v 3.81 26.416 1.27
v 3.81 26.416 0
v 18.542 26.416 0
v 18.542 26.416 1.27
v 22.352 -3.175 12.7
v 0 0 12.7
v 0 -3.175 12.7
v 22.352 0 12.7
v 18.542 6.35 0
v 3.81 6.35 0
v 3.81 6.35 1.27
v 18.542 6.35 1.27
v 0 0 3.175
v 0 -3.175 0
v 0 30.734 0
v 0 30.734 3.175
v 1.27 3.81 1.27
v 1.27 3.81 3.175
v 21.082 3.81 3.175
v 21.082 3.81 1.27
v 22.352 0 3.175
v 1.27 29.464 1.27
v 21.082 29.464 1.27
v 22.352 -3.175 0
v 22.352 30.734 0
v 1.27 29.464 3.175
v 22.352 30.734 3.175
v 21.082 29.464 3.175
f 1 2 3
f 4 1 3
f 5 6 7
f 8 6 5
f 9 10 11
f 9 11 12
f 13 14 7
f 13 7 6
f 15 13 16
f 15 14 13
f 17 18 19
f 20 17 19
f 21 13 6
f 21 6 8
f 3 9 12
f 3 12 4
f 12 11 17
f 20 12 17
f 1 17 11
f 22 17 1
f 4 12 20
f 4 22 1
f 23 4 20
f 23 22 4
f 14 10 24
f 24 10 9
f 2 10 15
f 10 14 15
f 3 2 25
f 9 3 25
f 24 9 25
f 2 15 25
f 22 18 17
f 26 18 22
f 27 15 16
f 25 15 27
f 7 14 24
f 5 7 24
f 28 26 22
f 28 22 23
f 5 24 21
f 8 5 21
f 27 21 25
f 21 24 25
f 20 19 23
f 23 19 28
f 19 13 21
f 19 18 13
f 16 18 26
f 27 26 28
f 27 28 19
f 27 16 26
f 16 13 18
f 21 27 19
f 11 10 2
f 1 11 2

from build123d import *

# Parameters (mm, degrees)
F0_W     = 22.352
F0_H     = 30.734
F0_W_2   = 14.732
F0_H_2   = 20.066
F1_DEPTH = 3.175
F2_W     = 19.812
F2_H     = 25.654
F2_W_2   = 14.732
F2_H_2   = 20.066
F3_DEPTH = 1.905
F0_H_3   = 3.175
F4_DEPTH = 12.7


with BuildPart() as f1:
    # F0 (on Top) → F1 (new body)
    with BuildSketch(Plane.XY):
        with Locations((11.176, 15.367)):
            Rectangle(F0_W, F0_H)
        with Locations((11.176, 16.383)):
            Rectangle(F0_W_2, F0_H_2, mode=Mode.SUBTRACT)
    extrude(amount=F1_DEPTH)

    # F2 (on face) → F3 (cut)
    with BuildSketch(Plane.XY.offset(3.175)):
        with Locations((11.176, 16.637)):
            Rectangle(F2_W, F2_H)
        with Locations((11.176, 16.383)):
            Rectangle(F2_W_2, F2_H_2, mode=Mode.SUBTRACT)
    extrude(amount=-F3_DEPTH, mode=Mode.SUBTRACT)

    # F0 (on Top) → F4 (join)
    with BuildSketch(Plane.XY):
        with Locations((11.176, -1.5875)):
            Rectangle(F0_W, F0_H_3)
    extrude(amount=F4_DEPTH)


solid = f1.part
